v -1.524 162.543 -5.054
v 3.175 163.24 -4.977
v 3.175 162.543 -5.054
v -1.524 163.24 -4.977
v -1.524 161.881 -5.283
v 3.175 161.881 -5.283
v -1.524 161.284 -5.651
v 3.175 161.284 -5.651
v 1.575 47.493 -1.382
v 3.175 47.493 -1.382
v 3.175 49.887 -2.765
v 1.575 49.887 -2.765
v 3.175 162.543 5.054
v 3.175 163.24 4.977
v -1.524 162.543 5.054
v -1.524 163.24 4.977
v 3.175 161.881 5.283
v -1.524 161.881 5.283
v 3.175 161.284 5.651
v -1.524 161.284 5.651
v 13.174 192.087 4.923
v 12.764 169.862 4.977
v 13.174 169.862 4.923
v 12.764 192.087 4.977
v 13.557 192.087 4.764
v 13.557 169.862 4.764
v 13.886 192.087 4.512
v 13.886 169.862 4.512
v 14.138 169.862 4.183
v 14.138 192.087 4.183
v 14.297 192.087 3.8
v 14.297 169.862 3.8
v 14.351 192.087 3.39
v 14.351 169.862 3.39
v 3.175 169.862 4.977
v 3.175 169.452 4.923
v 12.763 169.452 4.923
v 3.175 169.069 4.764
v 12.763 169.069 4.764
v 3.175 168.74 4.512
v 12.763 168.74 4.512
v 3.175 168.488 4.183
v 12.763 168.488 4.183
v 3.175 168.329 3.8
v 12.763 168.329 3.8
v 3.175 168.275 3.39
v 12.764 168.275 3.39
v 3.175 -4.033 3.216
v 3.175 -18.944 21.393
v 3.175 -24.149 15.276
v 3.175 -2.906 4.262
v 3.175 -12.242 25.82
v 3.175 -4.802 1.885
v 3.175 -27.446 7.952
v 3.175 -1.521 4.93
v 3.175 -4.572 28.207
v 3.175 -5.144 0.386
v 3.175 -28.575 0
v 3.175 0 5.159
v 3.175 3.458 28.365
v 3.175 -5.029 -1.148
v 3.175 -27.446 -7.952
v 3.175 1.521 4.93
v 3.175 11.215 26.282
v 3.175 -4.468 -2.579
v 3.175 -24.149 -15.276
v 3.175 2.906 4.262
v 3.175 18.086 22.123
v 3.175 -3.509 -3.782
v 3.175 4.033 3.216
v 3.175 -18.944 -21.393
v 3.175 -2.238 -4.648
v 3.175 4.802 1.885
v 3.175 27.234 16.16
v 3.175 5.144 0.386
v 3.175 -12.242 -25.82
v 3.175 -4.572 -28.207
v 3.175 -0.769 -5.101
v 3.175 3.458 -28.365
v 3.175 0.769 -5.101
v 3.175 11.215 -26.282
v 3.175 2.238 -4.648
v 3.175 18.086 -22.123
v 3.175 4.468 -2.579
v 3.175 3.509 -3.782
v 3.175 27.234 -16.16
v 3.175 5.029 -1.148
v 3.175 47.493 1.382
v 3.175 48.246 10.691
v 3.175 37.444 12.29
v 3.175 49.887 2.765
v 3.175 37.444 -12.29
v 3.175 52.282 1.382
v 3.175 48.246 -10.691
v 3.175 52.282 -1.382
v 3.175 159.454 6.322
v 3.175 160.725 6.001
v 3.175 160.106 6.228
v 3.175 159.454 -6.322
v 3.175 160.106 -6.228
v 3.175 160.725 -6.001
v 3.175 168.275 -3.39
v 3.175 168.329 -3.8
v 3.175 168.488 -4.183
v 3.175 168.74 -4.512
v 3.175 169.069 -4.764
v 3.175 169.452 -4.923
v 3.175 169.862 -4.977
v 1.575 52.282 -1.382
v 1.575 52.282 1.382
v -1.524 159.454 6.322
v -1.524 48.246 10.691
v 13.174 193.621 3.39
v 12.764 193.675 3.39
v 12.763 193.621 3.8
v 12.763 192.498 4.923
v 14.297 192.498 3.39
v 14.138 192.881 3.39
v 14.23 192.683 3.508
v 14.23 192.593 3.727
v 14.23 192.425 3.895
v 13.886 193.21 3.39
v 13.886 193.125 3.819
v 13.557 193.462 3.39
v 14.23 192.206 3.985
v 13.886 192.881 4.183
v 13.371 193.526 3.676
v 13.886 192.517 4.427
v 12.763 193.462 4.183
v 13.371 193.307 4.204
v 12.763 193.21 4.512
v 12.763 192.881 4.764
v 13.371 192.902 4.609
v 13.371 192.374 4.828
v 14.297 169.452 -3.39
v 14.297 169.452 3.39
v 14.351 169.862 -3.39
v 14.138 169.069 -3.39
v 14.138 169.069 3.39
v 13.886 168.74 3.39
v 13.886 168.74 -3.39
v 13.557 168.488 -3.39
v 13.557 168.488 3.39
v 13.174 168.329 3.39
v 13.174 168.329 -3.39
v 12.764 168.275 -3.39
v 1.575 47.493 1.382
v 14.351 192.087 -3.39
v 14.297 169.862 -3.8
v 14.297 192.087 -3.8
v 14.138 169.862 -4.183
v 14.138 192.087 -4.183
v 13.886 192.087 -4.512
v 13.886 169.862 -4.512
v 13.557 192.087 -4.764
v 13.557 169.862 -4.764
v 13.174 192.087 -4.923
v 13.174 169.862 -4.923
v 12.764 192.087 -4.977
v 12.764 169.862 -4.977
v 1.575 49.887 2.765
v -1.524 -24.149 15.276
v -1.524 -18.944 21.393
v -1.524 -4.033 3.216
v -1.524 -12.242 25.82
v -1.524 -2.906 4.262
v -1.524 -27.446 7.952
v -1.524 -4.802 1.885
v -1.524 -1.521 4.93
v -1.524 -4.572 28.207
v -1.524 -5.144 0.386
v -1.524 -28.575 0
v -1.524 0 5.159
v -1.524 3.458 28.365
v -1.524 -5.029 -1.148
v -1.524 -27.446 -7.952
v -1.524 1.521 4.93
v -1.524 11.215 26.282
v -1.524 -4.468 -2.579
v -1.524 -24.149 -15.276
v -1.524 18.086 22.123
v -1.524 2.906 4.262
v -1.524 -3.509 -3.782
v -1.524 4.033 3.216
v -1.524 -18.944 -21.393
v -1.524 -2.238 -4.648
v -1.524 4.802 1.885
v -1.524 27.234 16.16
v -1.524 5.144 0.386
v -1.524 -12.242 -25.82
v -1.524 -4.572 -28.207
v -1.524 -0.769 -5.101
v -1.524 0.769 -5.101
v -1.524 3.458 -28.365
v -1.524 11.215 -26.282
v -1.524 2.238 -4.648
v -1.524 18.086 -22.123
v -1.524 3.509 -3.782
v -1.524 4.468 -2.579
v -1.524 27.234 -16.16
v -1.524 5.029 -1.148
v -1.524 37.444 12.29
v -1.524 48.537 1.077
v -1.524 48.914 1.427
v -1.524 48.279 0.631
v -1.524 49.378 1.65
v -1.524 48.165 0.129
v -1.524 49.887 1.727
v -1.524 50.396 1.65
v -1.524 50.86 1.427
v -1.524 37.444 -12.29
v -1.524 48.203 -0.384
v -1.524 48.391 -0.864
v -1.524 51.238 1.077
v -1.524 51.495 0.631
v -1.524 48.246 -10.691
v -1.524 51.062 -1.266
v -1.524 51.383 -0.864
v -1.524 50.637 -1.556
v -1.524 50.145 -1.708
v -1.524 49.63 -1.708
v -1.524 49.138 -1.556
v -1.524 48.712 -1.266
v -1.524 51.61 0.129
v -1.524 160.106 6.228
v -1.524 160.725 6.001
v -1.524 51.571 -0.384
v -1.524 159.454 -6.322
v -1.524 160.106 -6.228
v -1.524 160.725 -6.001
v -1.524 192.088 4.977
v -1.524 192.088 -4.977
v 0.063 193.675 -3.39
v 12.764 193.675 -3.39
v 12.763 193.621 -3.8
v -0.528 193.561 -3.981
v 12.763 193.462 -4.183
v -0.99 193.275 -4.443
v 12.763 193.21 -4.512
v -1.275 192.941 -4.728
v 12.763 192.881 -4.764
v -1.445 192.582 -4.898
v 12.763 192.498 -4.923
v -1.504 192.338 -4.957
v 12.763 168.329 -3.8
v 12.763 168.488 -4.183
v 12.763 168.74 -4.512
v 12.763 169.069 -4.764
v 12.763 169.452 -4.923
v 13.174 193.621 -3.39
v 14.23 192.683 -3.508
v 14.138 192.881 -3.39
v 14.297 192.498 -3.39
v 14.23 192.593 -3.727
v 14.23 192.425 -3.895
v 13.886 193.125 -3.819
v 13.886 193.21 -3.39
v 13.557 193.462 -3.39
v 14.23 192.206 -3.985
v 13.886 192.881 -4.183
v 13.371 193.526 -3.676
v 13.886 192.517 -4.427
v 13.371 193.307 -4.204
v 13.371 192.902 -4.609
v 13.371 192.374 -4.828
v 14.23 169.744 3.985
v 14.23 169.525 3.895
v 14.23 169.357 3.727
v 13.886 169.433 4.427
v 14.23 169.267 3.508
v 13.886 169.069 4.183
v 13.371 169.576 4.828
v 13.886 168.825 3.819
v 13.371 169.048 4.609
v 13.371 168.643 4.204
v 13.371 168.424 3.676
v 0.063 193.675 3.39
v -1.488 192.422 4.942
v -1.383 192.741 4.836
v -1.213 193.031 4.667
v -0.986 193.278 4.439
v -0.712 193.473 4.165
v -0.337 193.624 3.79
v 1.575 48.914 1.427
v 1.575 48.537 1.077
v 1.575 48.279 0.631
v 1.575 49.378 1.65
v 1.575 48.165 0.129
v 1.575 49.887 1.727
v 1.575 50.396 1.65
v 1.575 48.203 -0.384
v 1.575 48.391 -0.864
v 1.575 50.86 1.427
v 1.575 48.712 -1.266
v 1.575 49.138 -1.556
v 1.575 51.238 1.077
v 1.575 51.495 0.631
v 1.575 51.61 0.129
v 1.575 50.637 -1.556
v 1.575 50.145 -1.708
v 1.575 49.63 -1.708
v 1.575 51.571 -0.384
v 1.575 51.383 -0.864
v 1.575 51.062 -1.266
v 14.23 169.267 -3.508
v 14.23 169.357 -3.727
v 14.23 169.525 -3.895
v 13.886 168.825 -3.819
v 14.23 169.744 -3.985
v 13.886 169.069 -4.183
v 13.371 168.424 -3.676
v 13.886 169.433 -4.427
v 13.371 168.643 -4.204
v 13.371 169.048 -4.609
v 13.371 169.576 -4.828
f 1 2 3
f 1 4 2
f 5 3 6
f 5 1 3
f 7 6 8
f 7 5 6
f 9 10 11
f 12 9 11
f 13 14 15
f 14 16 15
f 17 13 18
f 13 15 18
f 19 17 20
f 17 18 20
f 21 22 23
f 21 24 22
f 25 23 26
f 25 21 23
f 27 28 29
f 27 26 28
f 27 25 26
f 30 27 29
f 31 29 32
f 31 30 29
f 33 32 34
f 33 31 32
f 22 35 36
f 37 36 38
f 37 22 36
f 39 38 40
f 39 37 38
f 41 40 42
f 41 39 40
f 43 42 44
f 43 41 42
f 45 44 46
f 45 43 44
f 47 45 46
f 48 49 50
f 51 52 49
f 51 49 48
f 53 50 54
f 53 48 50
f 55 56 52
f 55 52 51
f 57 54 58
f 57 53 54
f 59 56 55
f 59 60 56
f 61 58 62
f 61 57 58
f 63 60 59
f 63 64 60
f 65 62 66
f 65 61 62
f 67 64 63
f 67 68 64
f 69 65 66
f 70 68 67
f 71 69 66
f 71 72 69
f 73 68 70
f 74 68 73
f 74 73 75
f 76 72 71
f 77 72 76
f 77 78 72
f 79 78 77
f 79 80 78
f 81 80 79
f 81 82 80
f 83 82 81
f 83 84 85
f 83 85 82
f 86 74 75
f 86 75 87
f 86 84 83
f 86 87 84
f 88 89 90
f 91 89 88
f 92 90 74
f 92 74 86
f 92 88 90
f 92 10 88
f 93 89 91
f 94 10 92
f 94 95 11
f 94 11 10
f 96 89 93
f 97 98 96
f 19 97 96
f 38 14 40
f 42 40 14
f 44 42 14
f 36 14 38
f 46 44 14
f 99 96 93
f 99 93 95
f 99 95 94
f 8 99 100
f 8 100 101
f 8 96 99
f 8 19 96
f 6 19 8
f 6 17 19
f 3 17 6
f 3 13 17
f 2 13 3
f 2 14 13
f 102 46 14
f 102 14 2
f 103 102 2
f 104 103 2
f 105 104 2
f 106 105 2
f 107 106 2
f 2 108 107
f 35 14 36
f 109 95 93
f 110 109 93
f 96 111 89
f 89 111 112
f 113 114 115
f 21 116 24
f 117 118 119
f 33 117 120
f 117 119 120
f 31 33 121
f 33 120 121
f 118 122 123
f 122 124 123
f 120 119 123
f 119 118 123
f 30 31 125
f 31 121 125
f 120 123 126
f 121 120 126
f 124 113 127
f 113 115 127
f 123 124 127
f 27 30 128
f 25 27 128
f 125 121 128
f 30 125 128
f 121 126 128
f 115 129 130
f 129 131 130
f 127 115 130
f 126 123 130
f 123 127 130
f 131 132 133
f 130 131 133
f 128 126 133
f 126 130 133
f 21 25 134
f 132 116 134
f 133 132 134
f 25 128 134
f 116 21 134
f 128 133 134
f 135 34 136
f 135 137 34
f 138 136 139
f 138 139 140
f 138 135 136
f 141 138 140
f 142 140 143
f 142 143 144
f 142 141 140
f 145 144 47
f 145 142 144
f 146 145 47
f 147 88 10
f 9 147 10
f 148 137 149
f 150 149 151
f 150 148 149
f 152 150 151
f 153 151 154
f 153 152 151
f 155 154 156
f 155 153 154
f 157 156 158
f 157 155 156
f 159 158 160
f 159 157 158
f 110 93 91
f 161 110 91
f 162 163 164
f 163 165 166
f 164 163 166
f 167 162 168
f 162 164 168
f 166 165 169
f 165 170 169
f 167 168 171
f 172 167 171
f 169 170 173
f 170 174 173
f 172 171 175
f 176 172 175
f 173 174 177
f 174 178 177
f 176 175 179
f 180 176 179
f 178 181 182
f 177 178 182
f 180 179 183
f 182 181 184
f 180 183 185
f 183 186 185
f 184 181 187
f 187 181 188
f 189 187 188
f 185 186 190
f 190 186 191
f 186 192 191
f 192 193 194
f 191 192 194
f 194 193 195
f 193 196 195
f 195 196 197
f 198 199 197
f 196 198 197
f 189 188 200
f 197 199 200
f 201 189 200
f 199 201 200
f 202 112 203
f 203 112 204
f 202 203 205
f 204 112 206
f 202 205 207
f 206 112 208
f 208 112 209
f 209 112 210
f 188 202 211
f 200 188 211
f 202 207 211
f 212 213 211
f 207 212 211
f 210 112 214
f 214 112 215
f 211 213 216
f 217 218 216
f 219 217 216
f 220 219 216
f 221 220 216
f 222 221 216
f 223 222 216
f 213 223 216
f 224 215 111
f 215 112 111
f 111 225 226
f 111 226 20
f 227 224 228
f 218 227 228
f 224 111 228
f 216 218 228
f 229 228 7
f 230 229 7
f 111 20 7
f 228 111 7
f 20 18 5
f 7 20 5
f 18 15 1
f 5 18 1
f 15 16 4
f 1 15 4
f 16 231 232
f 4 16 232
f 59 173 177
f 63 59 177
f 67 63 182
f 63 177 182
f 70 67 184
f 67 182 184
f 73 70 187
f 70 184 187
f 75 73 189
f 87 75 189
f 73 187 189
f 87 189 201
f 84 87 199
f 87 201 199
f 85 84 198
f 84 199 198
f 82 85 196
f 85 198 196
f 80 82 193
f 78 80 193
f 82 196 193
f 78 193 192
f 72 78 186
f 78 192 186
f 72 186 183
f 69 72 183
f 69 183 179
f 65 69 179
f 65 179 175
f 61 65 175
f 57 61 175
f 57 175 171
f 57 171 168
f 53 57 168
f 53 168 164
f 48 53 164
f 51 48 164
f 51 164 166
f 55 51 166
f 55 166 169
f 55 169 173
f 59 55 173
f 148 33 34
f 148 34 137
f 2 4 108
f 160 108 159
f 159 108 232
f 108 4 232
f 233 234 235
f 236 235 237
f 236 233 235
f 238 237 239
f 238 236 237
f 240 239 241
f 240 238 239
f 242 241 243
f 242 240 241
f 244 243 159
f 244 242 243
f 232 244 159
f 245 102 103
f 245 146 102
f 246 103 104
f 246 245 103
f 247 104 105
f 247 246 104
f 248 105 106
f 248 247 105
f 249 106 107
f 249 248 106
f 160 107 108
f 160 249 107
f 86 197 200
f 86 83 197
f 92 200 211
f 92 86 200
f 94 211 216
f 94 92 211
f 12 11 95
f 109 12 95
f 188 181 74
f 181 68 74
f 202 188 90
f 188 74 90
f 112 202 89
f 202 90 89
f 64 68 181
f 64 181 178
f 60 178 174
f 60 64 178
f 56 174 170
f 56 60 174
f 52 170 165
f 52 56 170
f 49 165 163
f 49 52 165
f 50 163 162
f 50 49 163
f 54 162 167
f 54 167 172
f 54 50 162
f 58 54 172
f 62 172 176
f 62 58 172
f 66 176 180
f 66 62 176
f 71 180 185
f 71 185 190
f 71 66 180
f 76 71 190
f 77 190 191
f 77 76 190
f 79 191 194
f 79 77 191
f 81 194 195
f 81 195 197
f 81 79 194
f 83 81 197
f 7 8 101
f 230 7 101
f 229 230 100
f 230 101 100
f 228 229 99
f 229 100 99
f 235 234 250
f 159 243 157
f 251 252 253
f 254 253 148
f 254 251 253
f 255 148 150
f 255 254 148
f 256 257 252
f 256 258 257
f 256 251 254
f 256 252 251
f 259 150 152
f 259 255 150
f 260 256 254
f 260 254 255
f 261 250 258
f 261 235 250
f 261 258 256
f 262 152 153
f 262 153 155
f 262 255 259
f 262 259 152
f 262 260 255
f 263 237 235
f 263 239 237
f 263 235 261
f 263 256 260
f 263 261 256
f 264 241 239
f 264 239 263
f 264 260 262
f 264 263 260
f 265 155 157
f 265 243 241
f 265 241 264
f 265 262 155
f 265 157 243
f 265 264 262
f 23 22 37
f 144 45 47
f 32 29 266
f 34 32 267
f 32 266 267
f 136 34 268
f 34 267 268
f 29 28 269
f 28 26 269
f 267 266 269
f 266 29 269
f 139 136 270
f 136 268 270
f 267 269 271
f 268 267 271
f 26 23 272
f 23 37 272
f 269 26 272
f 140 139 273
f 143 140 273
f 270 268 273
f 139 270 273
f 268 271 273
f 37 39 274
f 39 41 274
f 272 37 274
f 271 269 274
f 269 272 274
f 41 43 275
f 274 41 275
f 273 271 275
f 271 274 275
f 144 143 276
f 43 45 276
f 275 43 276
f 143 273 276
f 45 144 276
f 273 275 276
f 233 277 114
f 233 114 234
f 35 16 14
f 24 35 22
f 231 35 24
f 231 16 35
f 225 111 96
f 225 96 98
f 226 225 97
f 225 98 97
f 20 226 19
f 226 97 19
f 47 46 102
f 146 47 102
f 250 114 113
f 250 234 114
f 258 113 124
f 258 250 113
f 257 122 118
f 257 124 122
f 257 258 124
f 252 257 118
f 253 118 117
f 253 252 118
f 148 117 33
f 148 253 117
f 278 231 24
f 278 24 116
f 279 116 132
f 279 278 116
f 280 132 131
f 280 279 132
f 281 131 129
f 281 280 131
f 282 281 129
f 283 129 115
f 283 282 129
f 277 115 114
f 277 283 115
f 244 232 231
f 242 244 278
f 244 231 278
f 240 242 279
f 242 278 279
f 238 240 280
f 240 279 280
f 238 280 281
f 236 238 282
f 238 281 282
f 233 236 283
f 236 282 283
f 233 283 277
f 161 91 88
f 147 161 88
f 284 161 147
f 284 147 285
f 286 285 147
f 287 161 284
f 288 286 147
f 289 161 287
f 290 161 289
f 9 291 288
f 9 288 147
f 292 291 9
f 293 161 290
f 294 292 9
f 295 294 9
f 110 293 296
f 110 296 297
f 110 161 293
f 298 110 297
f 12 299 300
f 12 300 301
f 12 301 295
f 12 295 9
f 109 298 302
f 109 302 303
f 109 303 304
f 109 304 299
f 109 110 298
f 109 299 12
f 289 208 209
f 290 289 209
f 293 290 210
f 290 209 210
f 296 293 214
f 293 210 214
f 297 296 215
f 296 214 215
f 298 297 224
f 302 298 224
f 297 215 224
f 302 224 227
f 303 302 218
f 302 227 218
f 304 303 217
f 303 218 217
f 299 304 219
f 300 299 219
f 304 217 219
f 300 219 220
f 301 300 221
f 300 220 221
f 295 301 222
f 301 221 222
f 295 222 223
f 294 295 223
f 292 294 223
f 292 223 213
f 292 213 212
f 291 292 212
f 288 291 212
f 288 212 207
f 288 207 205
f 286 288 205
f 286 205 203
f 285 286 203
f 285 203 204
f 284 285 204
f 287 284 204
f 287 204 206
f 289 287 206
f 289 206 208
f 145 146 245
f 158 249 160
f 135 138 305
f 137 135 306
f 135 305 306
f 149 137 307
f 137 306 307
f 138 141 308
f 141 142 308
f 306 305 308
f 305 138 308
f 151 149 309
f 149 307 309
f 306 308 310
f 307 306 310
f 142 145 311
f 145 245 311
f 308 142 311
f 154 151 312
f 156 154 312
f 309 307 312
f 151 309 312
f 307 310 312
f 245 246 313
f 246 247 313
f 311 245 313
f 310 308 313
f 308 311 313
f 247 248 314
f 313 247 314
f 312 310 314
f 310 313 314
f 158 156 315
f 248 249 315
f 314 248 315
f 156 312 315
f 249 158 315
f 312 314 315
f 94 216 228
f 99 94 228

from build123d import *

# Parameters (mm, degrees)
SKETCH2_R                = 28.575
SKETCH2_R_2              = 11.1125
BOSS_EXTRUDE1_DEPTH      = 6.35
BOSS_EXTRUDE2_DEPTH      = 3.175
BOSS_EXTRUDE2_DEPTH_BACK = 1.524
SKETCH3_W                = 9.954249144
SKETCH3_H                = 25.4
BOSS_EXTRUDE3_DEPTH      = 11.176
SKETCH4_W                = 1.247460898
SKETCH4_H                = 31.75
CUT_EXTRUDE1_DEPTH       = 197.090385348
FILLET2_R                = 3.175
FILLET4_R                = 3.175
FILLET7_R                = 1.5875
SKETCH5_R                = 28.575
CUT_EXTRUDE2_DEPTH       = 197.296936937
SKETCH6_R                = 28.575
BOSS_EXTRUDE4_DEPTH      = 4.699
F_3_8_CLEARANCE_HOLE1_D  = 10.31748
FILLET9_R                = 50.8
F_4_CLEARANCE_HOLE1_D    = 3.4544
CUT_EXTRUDE3_DEPTH       = 1.6002


with BuildPart() as part:
    # Sketch2 → Boss-Extrude1 (new body)
    with BuildSketch(Plane(origin=(0, 0, 0), x_dir=(0, 0, -1), z_dir=(1, 0, 0))):
        Circle(SKETCH2_R)
        Circle(SKETCH2_R_2, mode=Mode.SUBTRACT)
    extrude(amount=-BOSS_EXTRUDE1_DEPTH)

    # Sketch2<5> → Boss-Extrude2 (add, two sides: drawn at the far end of the back side and taken through both)
    with BuildSketch(Plane(origin=(0, 0, 0), x_dir=(0, 0, -1), z_dir=(1, 0, 0)).offset(-BOSS_EXTRUDE2_DEPTH_BACK)):
        with BuildLine():
            Line((11.55989339, 26.132345662), (4.977124572, 193.675))
            Line((4.977124572, 193.675), (0, 193.675))
            Line((0, 193.675), (0, 28.575))
            ThreePointArc((0, 28.575), (5.907573431, 27.957668021), (11.55989339, 26.132345662))
        make_face()
        with BuildLine():
            Line((0, 28.575), (0, 193.675))
            Line((0, 193.675), (-4.977124572, 193.675))
            Line((-4.977124572, 193.675), (-11.55989339, 26.132345662))
            ThreePointArc((-11.55989339, 26.132345662), (-5.907573431, 27.957668021), (0, 28.575))
        make_face()
    extrude(amount=BOSS_EXTRUDE2_DEPTH + BOSS_EXTRUDE2_DEPTH_BACK)

    # Sketch3 → Boss-Extrude3 (add)
    with BuildSketch(Plane(origin=(3.175, 0, 0), x_dir=(0, 0, -1), z_dir=(1, 0, 0))):
        with Locations((0, 180.975)):
            Rectangle(SKETCH3_W, SKETCH3_H)
    extrude(amount=BOSS_EXTRUDE3_DEPTH)

    # Sketch4 → Cut-Extrude1 (cut, through all)
    with BuildSketch(Plane(origin=(3.175, 0, 0), x_dir=(0, 0, -1), z_dir=(1, 0, 0))):
        with Locations((-5.600855021, 177.8)):
            Rectangle(SKETCH4_W, SKETCH4_H)
        with Locations((5.600855021, 177.8)):
            Rectangle(SKETCH4_W, SKETCH4_H)
    extrude(amount=-CUT_EXTRUDE1_DEPTH, mode=Mode.SUBTRACT)

    # Fillet2
    # the kernel refuses this fillet: 3.175 mm, written as the material it takes off along each edge
    with BuildSketch(Plane(origin=(9.358070531, 161.925, 6.22458547), x_dir=(0, -0.999229036240723, 0.039259815759068305), z_dir=(-1, 0, 0))) as fillet2_piece_1:
        with BuildLine():
            CenterArc((2.473228212, -3.175), FILLET2_R, 90, 52.598124578)
            Line((-0.048975085, -1.24649915), (-0.099419151, -1.207929133))
            ThreePointArc((-0.099419151, -1.207929133), (-0.087938586, -0.620756577), (-0.063451044, 0.002492998))
            Line((-0.063451044, 0.002492998), (0, 0.0635))
            Line((0, 0.0635), (2.473228212, 0.0635))
            Line((2.473228212, 0.0635), (2.473228212, 0))
        make_face()
    extrude(amount=17.065141061, mode=Mode.SUBTRACT)
    with BuildSketch(Plane(origin=(9.358070531, 161.925, -6.22458547), x_dir=(0, 0, 1), z_dir=(-1, 0, 0))) as fillet2_piece_2:
        with BuildLine():
            CenterArc((3.075453706, -2.595971358), FILLET2_R, 125.151875422, 52.598124578)
            Line((-0.097098484, -2.471321443), (-0.160549528, -2.468828445))
            Line((-0.160549528, -2.468828445), (-0.063451044, 0.002492998))
            Line((-0.063451044, 0.002492998), (0, 0.0635))
            ThreePointArc((0, 0.0635), (0.623730449, 0.0635), (1.210901041, 0.051919427))
            Line((1.210901041, 0.051919427), (1.247460897, 0))
        make_face()
    extrude(amount=17.065141061, mode=Mode.SUBTRACT)

    # Fillet4
    fillet4_edges = [part.edges().sort_by_distance(p)[0] for p in [
        (0.8255, 161.925, 4.977124572),
        (0.8255, 161.925, -4.977124572),
    ]]
    fillet(fillet4_edges, radius=FILLET4_R)

    # Fillet7
    fillet7_edges = [part.edges().sort_by_distance(p)[0] for p in [
        (6.4135, 193.675, 4.977124572),
        (6.4135, 193.675, -4.977124572),
        (-1.524, 193.675, 0),
        (8.763, 168.275, 4.977124572),
        (8.763, 168.275, -4.977124572),
        (14.351, 193.675, 0),
        (14.351, 180.975, 4.977124572),
        (14.351, 168.275, 0),
        (14.351, 180.975, -4.977124572),
    ]]
    fillet(fillet7_edges, radius=FILLET7_R)

    # Sketch5 → Cut-Extrude2 (cut, through all)
    with BuildSketch(Plane(origin=(0, 0, 0), x_dir=(0, 0, -1), z_dir=(1, 0, 0))):
        Circle(SKETCH5_R)
    extrude(amount=-CUT_EXTRUDE2_DEPTH, mode=Mode.SUBTRACT)

    # Sketch6 → Boss-Extrude4 (add)
    with BuildSketch(Plane(origin=(3.175, 0, 0), x_dir=(0, 0, -1), z_dir=(1, 0, 0))):
        Circle(SKETCH6_R)
    extrude(amount=-BOSS_EXTRUDE4_DEPTH)

    # 3/8 Clearance Hole1 (through all)
    with Locations(Plane(origin=(3.175, 0, 0), x_dir=(0, 0, -1), z_dir=(1, 0, 0))):
        with Locations((0, 0)):
            Hole(F_3_8_CLEARANCE_HOLE1_D / 2)

    # Fillet9
    fillet9_edges = [part.edges().sort_by_distance(p)[0] for p in [
        (0.8255, 26.132345662, -11.55989339),
        (0.8255, 26.132345662, 11.55989339),
    ]]
    fillet(fillet9_edges, radius=FILLET9_R)

    # #4 Clearance Hole1 (through all)
    with Locations(Plane(origin=(3.175, 0, 0), x_dir=(0, 0, -1), z_dir=(1, 0, 0))):
        with Locations((0, 49.88728048)):
            Hole(F_4_CLEARANCE_HOLE1_D / 2)

    # Sketch11 → Cut-Extrude3 (cut)
    with BuildSketch(Plane(origin=(3.175, 0, 0), x_dir=(0, 0, -1), z_dir=(1, 0, 0))):
        Polygon((-1.382344076, 47.492990308), (1.382344076, 47.492990308), (2.764688151, 49.88728048), (1.382344076, 52.281570653), (-1.382344076, 52.281570653), (-2.764688151, 49.88728048), align=None)
    extrude(amount=-CUT_EXTRUDE3_DEPTH, mode=Mode.SUBTRACT)


solid = part.part
